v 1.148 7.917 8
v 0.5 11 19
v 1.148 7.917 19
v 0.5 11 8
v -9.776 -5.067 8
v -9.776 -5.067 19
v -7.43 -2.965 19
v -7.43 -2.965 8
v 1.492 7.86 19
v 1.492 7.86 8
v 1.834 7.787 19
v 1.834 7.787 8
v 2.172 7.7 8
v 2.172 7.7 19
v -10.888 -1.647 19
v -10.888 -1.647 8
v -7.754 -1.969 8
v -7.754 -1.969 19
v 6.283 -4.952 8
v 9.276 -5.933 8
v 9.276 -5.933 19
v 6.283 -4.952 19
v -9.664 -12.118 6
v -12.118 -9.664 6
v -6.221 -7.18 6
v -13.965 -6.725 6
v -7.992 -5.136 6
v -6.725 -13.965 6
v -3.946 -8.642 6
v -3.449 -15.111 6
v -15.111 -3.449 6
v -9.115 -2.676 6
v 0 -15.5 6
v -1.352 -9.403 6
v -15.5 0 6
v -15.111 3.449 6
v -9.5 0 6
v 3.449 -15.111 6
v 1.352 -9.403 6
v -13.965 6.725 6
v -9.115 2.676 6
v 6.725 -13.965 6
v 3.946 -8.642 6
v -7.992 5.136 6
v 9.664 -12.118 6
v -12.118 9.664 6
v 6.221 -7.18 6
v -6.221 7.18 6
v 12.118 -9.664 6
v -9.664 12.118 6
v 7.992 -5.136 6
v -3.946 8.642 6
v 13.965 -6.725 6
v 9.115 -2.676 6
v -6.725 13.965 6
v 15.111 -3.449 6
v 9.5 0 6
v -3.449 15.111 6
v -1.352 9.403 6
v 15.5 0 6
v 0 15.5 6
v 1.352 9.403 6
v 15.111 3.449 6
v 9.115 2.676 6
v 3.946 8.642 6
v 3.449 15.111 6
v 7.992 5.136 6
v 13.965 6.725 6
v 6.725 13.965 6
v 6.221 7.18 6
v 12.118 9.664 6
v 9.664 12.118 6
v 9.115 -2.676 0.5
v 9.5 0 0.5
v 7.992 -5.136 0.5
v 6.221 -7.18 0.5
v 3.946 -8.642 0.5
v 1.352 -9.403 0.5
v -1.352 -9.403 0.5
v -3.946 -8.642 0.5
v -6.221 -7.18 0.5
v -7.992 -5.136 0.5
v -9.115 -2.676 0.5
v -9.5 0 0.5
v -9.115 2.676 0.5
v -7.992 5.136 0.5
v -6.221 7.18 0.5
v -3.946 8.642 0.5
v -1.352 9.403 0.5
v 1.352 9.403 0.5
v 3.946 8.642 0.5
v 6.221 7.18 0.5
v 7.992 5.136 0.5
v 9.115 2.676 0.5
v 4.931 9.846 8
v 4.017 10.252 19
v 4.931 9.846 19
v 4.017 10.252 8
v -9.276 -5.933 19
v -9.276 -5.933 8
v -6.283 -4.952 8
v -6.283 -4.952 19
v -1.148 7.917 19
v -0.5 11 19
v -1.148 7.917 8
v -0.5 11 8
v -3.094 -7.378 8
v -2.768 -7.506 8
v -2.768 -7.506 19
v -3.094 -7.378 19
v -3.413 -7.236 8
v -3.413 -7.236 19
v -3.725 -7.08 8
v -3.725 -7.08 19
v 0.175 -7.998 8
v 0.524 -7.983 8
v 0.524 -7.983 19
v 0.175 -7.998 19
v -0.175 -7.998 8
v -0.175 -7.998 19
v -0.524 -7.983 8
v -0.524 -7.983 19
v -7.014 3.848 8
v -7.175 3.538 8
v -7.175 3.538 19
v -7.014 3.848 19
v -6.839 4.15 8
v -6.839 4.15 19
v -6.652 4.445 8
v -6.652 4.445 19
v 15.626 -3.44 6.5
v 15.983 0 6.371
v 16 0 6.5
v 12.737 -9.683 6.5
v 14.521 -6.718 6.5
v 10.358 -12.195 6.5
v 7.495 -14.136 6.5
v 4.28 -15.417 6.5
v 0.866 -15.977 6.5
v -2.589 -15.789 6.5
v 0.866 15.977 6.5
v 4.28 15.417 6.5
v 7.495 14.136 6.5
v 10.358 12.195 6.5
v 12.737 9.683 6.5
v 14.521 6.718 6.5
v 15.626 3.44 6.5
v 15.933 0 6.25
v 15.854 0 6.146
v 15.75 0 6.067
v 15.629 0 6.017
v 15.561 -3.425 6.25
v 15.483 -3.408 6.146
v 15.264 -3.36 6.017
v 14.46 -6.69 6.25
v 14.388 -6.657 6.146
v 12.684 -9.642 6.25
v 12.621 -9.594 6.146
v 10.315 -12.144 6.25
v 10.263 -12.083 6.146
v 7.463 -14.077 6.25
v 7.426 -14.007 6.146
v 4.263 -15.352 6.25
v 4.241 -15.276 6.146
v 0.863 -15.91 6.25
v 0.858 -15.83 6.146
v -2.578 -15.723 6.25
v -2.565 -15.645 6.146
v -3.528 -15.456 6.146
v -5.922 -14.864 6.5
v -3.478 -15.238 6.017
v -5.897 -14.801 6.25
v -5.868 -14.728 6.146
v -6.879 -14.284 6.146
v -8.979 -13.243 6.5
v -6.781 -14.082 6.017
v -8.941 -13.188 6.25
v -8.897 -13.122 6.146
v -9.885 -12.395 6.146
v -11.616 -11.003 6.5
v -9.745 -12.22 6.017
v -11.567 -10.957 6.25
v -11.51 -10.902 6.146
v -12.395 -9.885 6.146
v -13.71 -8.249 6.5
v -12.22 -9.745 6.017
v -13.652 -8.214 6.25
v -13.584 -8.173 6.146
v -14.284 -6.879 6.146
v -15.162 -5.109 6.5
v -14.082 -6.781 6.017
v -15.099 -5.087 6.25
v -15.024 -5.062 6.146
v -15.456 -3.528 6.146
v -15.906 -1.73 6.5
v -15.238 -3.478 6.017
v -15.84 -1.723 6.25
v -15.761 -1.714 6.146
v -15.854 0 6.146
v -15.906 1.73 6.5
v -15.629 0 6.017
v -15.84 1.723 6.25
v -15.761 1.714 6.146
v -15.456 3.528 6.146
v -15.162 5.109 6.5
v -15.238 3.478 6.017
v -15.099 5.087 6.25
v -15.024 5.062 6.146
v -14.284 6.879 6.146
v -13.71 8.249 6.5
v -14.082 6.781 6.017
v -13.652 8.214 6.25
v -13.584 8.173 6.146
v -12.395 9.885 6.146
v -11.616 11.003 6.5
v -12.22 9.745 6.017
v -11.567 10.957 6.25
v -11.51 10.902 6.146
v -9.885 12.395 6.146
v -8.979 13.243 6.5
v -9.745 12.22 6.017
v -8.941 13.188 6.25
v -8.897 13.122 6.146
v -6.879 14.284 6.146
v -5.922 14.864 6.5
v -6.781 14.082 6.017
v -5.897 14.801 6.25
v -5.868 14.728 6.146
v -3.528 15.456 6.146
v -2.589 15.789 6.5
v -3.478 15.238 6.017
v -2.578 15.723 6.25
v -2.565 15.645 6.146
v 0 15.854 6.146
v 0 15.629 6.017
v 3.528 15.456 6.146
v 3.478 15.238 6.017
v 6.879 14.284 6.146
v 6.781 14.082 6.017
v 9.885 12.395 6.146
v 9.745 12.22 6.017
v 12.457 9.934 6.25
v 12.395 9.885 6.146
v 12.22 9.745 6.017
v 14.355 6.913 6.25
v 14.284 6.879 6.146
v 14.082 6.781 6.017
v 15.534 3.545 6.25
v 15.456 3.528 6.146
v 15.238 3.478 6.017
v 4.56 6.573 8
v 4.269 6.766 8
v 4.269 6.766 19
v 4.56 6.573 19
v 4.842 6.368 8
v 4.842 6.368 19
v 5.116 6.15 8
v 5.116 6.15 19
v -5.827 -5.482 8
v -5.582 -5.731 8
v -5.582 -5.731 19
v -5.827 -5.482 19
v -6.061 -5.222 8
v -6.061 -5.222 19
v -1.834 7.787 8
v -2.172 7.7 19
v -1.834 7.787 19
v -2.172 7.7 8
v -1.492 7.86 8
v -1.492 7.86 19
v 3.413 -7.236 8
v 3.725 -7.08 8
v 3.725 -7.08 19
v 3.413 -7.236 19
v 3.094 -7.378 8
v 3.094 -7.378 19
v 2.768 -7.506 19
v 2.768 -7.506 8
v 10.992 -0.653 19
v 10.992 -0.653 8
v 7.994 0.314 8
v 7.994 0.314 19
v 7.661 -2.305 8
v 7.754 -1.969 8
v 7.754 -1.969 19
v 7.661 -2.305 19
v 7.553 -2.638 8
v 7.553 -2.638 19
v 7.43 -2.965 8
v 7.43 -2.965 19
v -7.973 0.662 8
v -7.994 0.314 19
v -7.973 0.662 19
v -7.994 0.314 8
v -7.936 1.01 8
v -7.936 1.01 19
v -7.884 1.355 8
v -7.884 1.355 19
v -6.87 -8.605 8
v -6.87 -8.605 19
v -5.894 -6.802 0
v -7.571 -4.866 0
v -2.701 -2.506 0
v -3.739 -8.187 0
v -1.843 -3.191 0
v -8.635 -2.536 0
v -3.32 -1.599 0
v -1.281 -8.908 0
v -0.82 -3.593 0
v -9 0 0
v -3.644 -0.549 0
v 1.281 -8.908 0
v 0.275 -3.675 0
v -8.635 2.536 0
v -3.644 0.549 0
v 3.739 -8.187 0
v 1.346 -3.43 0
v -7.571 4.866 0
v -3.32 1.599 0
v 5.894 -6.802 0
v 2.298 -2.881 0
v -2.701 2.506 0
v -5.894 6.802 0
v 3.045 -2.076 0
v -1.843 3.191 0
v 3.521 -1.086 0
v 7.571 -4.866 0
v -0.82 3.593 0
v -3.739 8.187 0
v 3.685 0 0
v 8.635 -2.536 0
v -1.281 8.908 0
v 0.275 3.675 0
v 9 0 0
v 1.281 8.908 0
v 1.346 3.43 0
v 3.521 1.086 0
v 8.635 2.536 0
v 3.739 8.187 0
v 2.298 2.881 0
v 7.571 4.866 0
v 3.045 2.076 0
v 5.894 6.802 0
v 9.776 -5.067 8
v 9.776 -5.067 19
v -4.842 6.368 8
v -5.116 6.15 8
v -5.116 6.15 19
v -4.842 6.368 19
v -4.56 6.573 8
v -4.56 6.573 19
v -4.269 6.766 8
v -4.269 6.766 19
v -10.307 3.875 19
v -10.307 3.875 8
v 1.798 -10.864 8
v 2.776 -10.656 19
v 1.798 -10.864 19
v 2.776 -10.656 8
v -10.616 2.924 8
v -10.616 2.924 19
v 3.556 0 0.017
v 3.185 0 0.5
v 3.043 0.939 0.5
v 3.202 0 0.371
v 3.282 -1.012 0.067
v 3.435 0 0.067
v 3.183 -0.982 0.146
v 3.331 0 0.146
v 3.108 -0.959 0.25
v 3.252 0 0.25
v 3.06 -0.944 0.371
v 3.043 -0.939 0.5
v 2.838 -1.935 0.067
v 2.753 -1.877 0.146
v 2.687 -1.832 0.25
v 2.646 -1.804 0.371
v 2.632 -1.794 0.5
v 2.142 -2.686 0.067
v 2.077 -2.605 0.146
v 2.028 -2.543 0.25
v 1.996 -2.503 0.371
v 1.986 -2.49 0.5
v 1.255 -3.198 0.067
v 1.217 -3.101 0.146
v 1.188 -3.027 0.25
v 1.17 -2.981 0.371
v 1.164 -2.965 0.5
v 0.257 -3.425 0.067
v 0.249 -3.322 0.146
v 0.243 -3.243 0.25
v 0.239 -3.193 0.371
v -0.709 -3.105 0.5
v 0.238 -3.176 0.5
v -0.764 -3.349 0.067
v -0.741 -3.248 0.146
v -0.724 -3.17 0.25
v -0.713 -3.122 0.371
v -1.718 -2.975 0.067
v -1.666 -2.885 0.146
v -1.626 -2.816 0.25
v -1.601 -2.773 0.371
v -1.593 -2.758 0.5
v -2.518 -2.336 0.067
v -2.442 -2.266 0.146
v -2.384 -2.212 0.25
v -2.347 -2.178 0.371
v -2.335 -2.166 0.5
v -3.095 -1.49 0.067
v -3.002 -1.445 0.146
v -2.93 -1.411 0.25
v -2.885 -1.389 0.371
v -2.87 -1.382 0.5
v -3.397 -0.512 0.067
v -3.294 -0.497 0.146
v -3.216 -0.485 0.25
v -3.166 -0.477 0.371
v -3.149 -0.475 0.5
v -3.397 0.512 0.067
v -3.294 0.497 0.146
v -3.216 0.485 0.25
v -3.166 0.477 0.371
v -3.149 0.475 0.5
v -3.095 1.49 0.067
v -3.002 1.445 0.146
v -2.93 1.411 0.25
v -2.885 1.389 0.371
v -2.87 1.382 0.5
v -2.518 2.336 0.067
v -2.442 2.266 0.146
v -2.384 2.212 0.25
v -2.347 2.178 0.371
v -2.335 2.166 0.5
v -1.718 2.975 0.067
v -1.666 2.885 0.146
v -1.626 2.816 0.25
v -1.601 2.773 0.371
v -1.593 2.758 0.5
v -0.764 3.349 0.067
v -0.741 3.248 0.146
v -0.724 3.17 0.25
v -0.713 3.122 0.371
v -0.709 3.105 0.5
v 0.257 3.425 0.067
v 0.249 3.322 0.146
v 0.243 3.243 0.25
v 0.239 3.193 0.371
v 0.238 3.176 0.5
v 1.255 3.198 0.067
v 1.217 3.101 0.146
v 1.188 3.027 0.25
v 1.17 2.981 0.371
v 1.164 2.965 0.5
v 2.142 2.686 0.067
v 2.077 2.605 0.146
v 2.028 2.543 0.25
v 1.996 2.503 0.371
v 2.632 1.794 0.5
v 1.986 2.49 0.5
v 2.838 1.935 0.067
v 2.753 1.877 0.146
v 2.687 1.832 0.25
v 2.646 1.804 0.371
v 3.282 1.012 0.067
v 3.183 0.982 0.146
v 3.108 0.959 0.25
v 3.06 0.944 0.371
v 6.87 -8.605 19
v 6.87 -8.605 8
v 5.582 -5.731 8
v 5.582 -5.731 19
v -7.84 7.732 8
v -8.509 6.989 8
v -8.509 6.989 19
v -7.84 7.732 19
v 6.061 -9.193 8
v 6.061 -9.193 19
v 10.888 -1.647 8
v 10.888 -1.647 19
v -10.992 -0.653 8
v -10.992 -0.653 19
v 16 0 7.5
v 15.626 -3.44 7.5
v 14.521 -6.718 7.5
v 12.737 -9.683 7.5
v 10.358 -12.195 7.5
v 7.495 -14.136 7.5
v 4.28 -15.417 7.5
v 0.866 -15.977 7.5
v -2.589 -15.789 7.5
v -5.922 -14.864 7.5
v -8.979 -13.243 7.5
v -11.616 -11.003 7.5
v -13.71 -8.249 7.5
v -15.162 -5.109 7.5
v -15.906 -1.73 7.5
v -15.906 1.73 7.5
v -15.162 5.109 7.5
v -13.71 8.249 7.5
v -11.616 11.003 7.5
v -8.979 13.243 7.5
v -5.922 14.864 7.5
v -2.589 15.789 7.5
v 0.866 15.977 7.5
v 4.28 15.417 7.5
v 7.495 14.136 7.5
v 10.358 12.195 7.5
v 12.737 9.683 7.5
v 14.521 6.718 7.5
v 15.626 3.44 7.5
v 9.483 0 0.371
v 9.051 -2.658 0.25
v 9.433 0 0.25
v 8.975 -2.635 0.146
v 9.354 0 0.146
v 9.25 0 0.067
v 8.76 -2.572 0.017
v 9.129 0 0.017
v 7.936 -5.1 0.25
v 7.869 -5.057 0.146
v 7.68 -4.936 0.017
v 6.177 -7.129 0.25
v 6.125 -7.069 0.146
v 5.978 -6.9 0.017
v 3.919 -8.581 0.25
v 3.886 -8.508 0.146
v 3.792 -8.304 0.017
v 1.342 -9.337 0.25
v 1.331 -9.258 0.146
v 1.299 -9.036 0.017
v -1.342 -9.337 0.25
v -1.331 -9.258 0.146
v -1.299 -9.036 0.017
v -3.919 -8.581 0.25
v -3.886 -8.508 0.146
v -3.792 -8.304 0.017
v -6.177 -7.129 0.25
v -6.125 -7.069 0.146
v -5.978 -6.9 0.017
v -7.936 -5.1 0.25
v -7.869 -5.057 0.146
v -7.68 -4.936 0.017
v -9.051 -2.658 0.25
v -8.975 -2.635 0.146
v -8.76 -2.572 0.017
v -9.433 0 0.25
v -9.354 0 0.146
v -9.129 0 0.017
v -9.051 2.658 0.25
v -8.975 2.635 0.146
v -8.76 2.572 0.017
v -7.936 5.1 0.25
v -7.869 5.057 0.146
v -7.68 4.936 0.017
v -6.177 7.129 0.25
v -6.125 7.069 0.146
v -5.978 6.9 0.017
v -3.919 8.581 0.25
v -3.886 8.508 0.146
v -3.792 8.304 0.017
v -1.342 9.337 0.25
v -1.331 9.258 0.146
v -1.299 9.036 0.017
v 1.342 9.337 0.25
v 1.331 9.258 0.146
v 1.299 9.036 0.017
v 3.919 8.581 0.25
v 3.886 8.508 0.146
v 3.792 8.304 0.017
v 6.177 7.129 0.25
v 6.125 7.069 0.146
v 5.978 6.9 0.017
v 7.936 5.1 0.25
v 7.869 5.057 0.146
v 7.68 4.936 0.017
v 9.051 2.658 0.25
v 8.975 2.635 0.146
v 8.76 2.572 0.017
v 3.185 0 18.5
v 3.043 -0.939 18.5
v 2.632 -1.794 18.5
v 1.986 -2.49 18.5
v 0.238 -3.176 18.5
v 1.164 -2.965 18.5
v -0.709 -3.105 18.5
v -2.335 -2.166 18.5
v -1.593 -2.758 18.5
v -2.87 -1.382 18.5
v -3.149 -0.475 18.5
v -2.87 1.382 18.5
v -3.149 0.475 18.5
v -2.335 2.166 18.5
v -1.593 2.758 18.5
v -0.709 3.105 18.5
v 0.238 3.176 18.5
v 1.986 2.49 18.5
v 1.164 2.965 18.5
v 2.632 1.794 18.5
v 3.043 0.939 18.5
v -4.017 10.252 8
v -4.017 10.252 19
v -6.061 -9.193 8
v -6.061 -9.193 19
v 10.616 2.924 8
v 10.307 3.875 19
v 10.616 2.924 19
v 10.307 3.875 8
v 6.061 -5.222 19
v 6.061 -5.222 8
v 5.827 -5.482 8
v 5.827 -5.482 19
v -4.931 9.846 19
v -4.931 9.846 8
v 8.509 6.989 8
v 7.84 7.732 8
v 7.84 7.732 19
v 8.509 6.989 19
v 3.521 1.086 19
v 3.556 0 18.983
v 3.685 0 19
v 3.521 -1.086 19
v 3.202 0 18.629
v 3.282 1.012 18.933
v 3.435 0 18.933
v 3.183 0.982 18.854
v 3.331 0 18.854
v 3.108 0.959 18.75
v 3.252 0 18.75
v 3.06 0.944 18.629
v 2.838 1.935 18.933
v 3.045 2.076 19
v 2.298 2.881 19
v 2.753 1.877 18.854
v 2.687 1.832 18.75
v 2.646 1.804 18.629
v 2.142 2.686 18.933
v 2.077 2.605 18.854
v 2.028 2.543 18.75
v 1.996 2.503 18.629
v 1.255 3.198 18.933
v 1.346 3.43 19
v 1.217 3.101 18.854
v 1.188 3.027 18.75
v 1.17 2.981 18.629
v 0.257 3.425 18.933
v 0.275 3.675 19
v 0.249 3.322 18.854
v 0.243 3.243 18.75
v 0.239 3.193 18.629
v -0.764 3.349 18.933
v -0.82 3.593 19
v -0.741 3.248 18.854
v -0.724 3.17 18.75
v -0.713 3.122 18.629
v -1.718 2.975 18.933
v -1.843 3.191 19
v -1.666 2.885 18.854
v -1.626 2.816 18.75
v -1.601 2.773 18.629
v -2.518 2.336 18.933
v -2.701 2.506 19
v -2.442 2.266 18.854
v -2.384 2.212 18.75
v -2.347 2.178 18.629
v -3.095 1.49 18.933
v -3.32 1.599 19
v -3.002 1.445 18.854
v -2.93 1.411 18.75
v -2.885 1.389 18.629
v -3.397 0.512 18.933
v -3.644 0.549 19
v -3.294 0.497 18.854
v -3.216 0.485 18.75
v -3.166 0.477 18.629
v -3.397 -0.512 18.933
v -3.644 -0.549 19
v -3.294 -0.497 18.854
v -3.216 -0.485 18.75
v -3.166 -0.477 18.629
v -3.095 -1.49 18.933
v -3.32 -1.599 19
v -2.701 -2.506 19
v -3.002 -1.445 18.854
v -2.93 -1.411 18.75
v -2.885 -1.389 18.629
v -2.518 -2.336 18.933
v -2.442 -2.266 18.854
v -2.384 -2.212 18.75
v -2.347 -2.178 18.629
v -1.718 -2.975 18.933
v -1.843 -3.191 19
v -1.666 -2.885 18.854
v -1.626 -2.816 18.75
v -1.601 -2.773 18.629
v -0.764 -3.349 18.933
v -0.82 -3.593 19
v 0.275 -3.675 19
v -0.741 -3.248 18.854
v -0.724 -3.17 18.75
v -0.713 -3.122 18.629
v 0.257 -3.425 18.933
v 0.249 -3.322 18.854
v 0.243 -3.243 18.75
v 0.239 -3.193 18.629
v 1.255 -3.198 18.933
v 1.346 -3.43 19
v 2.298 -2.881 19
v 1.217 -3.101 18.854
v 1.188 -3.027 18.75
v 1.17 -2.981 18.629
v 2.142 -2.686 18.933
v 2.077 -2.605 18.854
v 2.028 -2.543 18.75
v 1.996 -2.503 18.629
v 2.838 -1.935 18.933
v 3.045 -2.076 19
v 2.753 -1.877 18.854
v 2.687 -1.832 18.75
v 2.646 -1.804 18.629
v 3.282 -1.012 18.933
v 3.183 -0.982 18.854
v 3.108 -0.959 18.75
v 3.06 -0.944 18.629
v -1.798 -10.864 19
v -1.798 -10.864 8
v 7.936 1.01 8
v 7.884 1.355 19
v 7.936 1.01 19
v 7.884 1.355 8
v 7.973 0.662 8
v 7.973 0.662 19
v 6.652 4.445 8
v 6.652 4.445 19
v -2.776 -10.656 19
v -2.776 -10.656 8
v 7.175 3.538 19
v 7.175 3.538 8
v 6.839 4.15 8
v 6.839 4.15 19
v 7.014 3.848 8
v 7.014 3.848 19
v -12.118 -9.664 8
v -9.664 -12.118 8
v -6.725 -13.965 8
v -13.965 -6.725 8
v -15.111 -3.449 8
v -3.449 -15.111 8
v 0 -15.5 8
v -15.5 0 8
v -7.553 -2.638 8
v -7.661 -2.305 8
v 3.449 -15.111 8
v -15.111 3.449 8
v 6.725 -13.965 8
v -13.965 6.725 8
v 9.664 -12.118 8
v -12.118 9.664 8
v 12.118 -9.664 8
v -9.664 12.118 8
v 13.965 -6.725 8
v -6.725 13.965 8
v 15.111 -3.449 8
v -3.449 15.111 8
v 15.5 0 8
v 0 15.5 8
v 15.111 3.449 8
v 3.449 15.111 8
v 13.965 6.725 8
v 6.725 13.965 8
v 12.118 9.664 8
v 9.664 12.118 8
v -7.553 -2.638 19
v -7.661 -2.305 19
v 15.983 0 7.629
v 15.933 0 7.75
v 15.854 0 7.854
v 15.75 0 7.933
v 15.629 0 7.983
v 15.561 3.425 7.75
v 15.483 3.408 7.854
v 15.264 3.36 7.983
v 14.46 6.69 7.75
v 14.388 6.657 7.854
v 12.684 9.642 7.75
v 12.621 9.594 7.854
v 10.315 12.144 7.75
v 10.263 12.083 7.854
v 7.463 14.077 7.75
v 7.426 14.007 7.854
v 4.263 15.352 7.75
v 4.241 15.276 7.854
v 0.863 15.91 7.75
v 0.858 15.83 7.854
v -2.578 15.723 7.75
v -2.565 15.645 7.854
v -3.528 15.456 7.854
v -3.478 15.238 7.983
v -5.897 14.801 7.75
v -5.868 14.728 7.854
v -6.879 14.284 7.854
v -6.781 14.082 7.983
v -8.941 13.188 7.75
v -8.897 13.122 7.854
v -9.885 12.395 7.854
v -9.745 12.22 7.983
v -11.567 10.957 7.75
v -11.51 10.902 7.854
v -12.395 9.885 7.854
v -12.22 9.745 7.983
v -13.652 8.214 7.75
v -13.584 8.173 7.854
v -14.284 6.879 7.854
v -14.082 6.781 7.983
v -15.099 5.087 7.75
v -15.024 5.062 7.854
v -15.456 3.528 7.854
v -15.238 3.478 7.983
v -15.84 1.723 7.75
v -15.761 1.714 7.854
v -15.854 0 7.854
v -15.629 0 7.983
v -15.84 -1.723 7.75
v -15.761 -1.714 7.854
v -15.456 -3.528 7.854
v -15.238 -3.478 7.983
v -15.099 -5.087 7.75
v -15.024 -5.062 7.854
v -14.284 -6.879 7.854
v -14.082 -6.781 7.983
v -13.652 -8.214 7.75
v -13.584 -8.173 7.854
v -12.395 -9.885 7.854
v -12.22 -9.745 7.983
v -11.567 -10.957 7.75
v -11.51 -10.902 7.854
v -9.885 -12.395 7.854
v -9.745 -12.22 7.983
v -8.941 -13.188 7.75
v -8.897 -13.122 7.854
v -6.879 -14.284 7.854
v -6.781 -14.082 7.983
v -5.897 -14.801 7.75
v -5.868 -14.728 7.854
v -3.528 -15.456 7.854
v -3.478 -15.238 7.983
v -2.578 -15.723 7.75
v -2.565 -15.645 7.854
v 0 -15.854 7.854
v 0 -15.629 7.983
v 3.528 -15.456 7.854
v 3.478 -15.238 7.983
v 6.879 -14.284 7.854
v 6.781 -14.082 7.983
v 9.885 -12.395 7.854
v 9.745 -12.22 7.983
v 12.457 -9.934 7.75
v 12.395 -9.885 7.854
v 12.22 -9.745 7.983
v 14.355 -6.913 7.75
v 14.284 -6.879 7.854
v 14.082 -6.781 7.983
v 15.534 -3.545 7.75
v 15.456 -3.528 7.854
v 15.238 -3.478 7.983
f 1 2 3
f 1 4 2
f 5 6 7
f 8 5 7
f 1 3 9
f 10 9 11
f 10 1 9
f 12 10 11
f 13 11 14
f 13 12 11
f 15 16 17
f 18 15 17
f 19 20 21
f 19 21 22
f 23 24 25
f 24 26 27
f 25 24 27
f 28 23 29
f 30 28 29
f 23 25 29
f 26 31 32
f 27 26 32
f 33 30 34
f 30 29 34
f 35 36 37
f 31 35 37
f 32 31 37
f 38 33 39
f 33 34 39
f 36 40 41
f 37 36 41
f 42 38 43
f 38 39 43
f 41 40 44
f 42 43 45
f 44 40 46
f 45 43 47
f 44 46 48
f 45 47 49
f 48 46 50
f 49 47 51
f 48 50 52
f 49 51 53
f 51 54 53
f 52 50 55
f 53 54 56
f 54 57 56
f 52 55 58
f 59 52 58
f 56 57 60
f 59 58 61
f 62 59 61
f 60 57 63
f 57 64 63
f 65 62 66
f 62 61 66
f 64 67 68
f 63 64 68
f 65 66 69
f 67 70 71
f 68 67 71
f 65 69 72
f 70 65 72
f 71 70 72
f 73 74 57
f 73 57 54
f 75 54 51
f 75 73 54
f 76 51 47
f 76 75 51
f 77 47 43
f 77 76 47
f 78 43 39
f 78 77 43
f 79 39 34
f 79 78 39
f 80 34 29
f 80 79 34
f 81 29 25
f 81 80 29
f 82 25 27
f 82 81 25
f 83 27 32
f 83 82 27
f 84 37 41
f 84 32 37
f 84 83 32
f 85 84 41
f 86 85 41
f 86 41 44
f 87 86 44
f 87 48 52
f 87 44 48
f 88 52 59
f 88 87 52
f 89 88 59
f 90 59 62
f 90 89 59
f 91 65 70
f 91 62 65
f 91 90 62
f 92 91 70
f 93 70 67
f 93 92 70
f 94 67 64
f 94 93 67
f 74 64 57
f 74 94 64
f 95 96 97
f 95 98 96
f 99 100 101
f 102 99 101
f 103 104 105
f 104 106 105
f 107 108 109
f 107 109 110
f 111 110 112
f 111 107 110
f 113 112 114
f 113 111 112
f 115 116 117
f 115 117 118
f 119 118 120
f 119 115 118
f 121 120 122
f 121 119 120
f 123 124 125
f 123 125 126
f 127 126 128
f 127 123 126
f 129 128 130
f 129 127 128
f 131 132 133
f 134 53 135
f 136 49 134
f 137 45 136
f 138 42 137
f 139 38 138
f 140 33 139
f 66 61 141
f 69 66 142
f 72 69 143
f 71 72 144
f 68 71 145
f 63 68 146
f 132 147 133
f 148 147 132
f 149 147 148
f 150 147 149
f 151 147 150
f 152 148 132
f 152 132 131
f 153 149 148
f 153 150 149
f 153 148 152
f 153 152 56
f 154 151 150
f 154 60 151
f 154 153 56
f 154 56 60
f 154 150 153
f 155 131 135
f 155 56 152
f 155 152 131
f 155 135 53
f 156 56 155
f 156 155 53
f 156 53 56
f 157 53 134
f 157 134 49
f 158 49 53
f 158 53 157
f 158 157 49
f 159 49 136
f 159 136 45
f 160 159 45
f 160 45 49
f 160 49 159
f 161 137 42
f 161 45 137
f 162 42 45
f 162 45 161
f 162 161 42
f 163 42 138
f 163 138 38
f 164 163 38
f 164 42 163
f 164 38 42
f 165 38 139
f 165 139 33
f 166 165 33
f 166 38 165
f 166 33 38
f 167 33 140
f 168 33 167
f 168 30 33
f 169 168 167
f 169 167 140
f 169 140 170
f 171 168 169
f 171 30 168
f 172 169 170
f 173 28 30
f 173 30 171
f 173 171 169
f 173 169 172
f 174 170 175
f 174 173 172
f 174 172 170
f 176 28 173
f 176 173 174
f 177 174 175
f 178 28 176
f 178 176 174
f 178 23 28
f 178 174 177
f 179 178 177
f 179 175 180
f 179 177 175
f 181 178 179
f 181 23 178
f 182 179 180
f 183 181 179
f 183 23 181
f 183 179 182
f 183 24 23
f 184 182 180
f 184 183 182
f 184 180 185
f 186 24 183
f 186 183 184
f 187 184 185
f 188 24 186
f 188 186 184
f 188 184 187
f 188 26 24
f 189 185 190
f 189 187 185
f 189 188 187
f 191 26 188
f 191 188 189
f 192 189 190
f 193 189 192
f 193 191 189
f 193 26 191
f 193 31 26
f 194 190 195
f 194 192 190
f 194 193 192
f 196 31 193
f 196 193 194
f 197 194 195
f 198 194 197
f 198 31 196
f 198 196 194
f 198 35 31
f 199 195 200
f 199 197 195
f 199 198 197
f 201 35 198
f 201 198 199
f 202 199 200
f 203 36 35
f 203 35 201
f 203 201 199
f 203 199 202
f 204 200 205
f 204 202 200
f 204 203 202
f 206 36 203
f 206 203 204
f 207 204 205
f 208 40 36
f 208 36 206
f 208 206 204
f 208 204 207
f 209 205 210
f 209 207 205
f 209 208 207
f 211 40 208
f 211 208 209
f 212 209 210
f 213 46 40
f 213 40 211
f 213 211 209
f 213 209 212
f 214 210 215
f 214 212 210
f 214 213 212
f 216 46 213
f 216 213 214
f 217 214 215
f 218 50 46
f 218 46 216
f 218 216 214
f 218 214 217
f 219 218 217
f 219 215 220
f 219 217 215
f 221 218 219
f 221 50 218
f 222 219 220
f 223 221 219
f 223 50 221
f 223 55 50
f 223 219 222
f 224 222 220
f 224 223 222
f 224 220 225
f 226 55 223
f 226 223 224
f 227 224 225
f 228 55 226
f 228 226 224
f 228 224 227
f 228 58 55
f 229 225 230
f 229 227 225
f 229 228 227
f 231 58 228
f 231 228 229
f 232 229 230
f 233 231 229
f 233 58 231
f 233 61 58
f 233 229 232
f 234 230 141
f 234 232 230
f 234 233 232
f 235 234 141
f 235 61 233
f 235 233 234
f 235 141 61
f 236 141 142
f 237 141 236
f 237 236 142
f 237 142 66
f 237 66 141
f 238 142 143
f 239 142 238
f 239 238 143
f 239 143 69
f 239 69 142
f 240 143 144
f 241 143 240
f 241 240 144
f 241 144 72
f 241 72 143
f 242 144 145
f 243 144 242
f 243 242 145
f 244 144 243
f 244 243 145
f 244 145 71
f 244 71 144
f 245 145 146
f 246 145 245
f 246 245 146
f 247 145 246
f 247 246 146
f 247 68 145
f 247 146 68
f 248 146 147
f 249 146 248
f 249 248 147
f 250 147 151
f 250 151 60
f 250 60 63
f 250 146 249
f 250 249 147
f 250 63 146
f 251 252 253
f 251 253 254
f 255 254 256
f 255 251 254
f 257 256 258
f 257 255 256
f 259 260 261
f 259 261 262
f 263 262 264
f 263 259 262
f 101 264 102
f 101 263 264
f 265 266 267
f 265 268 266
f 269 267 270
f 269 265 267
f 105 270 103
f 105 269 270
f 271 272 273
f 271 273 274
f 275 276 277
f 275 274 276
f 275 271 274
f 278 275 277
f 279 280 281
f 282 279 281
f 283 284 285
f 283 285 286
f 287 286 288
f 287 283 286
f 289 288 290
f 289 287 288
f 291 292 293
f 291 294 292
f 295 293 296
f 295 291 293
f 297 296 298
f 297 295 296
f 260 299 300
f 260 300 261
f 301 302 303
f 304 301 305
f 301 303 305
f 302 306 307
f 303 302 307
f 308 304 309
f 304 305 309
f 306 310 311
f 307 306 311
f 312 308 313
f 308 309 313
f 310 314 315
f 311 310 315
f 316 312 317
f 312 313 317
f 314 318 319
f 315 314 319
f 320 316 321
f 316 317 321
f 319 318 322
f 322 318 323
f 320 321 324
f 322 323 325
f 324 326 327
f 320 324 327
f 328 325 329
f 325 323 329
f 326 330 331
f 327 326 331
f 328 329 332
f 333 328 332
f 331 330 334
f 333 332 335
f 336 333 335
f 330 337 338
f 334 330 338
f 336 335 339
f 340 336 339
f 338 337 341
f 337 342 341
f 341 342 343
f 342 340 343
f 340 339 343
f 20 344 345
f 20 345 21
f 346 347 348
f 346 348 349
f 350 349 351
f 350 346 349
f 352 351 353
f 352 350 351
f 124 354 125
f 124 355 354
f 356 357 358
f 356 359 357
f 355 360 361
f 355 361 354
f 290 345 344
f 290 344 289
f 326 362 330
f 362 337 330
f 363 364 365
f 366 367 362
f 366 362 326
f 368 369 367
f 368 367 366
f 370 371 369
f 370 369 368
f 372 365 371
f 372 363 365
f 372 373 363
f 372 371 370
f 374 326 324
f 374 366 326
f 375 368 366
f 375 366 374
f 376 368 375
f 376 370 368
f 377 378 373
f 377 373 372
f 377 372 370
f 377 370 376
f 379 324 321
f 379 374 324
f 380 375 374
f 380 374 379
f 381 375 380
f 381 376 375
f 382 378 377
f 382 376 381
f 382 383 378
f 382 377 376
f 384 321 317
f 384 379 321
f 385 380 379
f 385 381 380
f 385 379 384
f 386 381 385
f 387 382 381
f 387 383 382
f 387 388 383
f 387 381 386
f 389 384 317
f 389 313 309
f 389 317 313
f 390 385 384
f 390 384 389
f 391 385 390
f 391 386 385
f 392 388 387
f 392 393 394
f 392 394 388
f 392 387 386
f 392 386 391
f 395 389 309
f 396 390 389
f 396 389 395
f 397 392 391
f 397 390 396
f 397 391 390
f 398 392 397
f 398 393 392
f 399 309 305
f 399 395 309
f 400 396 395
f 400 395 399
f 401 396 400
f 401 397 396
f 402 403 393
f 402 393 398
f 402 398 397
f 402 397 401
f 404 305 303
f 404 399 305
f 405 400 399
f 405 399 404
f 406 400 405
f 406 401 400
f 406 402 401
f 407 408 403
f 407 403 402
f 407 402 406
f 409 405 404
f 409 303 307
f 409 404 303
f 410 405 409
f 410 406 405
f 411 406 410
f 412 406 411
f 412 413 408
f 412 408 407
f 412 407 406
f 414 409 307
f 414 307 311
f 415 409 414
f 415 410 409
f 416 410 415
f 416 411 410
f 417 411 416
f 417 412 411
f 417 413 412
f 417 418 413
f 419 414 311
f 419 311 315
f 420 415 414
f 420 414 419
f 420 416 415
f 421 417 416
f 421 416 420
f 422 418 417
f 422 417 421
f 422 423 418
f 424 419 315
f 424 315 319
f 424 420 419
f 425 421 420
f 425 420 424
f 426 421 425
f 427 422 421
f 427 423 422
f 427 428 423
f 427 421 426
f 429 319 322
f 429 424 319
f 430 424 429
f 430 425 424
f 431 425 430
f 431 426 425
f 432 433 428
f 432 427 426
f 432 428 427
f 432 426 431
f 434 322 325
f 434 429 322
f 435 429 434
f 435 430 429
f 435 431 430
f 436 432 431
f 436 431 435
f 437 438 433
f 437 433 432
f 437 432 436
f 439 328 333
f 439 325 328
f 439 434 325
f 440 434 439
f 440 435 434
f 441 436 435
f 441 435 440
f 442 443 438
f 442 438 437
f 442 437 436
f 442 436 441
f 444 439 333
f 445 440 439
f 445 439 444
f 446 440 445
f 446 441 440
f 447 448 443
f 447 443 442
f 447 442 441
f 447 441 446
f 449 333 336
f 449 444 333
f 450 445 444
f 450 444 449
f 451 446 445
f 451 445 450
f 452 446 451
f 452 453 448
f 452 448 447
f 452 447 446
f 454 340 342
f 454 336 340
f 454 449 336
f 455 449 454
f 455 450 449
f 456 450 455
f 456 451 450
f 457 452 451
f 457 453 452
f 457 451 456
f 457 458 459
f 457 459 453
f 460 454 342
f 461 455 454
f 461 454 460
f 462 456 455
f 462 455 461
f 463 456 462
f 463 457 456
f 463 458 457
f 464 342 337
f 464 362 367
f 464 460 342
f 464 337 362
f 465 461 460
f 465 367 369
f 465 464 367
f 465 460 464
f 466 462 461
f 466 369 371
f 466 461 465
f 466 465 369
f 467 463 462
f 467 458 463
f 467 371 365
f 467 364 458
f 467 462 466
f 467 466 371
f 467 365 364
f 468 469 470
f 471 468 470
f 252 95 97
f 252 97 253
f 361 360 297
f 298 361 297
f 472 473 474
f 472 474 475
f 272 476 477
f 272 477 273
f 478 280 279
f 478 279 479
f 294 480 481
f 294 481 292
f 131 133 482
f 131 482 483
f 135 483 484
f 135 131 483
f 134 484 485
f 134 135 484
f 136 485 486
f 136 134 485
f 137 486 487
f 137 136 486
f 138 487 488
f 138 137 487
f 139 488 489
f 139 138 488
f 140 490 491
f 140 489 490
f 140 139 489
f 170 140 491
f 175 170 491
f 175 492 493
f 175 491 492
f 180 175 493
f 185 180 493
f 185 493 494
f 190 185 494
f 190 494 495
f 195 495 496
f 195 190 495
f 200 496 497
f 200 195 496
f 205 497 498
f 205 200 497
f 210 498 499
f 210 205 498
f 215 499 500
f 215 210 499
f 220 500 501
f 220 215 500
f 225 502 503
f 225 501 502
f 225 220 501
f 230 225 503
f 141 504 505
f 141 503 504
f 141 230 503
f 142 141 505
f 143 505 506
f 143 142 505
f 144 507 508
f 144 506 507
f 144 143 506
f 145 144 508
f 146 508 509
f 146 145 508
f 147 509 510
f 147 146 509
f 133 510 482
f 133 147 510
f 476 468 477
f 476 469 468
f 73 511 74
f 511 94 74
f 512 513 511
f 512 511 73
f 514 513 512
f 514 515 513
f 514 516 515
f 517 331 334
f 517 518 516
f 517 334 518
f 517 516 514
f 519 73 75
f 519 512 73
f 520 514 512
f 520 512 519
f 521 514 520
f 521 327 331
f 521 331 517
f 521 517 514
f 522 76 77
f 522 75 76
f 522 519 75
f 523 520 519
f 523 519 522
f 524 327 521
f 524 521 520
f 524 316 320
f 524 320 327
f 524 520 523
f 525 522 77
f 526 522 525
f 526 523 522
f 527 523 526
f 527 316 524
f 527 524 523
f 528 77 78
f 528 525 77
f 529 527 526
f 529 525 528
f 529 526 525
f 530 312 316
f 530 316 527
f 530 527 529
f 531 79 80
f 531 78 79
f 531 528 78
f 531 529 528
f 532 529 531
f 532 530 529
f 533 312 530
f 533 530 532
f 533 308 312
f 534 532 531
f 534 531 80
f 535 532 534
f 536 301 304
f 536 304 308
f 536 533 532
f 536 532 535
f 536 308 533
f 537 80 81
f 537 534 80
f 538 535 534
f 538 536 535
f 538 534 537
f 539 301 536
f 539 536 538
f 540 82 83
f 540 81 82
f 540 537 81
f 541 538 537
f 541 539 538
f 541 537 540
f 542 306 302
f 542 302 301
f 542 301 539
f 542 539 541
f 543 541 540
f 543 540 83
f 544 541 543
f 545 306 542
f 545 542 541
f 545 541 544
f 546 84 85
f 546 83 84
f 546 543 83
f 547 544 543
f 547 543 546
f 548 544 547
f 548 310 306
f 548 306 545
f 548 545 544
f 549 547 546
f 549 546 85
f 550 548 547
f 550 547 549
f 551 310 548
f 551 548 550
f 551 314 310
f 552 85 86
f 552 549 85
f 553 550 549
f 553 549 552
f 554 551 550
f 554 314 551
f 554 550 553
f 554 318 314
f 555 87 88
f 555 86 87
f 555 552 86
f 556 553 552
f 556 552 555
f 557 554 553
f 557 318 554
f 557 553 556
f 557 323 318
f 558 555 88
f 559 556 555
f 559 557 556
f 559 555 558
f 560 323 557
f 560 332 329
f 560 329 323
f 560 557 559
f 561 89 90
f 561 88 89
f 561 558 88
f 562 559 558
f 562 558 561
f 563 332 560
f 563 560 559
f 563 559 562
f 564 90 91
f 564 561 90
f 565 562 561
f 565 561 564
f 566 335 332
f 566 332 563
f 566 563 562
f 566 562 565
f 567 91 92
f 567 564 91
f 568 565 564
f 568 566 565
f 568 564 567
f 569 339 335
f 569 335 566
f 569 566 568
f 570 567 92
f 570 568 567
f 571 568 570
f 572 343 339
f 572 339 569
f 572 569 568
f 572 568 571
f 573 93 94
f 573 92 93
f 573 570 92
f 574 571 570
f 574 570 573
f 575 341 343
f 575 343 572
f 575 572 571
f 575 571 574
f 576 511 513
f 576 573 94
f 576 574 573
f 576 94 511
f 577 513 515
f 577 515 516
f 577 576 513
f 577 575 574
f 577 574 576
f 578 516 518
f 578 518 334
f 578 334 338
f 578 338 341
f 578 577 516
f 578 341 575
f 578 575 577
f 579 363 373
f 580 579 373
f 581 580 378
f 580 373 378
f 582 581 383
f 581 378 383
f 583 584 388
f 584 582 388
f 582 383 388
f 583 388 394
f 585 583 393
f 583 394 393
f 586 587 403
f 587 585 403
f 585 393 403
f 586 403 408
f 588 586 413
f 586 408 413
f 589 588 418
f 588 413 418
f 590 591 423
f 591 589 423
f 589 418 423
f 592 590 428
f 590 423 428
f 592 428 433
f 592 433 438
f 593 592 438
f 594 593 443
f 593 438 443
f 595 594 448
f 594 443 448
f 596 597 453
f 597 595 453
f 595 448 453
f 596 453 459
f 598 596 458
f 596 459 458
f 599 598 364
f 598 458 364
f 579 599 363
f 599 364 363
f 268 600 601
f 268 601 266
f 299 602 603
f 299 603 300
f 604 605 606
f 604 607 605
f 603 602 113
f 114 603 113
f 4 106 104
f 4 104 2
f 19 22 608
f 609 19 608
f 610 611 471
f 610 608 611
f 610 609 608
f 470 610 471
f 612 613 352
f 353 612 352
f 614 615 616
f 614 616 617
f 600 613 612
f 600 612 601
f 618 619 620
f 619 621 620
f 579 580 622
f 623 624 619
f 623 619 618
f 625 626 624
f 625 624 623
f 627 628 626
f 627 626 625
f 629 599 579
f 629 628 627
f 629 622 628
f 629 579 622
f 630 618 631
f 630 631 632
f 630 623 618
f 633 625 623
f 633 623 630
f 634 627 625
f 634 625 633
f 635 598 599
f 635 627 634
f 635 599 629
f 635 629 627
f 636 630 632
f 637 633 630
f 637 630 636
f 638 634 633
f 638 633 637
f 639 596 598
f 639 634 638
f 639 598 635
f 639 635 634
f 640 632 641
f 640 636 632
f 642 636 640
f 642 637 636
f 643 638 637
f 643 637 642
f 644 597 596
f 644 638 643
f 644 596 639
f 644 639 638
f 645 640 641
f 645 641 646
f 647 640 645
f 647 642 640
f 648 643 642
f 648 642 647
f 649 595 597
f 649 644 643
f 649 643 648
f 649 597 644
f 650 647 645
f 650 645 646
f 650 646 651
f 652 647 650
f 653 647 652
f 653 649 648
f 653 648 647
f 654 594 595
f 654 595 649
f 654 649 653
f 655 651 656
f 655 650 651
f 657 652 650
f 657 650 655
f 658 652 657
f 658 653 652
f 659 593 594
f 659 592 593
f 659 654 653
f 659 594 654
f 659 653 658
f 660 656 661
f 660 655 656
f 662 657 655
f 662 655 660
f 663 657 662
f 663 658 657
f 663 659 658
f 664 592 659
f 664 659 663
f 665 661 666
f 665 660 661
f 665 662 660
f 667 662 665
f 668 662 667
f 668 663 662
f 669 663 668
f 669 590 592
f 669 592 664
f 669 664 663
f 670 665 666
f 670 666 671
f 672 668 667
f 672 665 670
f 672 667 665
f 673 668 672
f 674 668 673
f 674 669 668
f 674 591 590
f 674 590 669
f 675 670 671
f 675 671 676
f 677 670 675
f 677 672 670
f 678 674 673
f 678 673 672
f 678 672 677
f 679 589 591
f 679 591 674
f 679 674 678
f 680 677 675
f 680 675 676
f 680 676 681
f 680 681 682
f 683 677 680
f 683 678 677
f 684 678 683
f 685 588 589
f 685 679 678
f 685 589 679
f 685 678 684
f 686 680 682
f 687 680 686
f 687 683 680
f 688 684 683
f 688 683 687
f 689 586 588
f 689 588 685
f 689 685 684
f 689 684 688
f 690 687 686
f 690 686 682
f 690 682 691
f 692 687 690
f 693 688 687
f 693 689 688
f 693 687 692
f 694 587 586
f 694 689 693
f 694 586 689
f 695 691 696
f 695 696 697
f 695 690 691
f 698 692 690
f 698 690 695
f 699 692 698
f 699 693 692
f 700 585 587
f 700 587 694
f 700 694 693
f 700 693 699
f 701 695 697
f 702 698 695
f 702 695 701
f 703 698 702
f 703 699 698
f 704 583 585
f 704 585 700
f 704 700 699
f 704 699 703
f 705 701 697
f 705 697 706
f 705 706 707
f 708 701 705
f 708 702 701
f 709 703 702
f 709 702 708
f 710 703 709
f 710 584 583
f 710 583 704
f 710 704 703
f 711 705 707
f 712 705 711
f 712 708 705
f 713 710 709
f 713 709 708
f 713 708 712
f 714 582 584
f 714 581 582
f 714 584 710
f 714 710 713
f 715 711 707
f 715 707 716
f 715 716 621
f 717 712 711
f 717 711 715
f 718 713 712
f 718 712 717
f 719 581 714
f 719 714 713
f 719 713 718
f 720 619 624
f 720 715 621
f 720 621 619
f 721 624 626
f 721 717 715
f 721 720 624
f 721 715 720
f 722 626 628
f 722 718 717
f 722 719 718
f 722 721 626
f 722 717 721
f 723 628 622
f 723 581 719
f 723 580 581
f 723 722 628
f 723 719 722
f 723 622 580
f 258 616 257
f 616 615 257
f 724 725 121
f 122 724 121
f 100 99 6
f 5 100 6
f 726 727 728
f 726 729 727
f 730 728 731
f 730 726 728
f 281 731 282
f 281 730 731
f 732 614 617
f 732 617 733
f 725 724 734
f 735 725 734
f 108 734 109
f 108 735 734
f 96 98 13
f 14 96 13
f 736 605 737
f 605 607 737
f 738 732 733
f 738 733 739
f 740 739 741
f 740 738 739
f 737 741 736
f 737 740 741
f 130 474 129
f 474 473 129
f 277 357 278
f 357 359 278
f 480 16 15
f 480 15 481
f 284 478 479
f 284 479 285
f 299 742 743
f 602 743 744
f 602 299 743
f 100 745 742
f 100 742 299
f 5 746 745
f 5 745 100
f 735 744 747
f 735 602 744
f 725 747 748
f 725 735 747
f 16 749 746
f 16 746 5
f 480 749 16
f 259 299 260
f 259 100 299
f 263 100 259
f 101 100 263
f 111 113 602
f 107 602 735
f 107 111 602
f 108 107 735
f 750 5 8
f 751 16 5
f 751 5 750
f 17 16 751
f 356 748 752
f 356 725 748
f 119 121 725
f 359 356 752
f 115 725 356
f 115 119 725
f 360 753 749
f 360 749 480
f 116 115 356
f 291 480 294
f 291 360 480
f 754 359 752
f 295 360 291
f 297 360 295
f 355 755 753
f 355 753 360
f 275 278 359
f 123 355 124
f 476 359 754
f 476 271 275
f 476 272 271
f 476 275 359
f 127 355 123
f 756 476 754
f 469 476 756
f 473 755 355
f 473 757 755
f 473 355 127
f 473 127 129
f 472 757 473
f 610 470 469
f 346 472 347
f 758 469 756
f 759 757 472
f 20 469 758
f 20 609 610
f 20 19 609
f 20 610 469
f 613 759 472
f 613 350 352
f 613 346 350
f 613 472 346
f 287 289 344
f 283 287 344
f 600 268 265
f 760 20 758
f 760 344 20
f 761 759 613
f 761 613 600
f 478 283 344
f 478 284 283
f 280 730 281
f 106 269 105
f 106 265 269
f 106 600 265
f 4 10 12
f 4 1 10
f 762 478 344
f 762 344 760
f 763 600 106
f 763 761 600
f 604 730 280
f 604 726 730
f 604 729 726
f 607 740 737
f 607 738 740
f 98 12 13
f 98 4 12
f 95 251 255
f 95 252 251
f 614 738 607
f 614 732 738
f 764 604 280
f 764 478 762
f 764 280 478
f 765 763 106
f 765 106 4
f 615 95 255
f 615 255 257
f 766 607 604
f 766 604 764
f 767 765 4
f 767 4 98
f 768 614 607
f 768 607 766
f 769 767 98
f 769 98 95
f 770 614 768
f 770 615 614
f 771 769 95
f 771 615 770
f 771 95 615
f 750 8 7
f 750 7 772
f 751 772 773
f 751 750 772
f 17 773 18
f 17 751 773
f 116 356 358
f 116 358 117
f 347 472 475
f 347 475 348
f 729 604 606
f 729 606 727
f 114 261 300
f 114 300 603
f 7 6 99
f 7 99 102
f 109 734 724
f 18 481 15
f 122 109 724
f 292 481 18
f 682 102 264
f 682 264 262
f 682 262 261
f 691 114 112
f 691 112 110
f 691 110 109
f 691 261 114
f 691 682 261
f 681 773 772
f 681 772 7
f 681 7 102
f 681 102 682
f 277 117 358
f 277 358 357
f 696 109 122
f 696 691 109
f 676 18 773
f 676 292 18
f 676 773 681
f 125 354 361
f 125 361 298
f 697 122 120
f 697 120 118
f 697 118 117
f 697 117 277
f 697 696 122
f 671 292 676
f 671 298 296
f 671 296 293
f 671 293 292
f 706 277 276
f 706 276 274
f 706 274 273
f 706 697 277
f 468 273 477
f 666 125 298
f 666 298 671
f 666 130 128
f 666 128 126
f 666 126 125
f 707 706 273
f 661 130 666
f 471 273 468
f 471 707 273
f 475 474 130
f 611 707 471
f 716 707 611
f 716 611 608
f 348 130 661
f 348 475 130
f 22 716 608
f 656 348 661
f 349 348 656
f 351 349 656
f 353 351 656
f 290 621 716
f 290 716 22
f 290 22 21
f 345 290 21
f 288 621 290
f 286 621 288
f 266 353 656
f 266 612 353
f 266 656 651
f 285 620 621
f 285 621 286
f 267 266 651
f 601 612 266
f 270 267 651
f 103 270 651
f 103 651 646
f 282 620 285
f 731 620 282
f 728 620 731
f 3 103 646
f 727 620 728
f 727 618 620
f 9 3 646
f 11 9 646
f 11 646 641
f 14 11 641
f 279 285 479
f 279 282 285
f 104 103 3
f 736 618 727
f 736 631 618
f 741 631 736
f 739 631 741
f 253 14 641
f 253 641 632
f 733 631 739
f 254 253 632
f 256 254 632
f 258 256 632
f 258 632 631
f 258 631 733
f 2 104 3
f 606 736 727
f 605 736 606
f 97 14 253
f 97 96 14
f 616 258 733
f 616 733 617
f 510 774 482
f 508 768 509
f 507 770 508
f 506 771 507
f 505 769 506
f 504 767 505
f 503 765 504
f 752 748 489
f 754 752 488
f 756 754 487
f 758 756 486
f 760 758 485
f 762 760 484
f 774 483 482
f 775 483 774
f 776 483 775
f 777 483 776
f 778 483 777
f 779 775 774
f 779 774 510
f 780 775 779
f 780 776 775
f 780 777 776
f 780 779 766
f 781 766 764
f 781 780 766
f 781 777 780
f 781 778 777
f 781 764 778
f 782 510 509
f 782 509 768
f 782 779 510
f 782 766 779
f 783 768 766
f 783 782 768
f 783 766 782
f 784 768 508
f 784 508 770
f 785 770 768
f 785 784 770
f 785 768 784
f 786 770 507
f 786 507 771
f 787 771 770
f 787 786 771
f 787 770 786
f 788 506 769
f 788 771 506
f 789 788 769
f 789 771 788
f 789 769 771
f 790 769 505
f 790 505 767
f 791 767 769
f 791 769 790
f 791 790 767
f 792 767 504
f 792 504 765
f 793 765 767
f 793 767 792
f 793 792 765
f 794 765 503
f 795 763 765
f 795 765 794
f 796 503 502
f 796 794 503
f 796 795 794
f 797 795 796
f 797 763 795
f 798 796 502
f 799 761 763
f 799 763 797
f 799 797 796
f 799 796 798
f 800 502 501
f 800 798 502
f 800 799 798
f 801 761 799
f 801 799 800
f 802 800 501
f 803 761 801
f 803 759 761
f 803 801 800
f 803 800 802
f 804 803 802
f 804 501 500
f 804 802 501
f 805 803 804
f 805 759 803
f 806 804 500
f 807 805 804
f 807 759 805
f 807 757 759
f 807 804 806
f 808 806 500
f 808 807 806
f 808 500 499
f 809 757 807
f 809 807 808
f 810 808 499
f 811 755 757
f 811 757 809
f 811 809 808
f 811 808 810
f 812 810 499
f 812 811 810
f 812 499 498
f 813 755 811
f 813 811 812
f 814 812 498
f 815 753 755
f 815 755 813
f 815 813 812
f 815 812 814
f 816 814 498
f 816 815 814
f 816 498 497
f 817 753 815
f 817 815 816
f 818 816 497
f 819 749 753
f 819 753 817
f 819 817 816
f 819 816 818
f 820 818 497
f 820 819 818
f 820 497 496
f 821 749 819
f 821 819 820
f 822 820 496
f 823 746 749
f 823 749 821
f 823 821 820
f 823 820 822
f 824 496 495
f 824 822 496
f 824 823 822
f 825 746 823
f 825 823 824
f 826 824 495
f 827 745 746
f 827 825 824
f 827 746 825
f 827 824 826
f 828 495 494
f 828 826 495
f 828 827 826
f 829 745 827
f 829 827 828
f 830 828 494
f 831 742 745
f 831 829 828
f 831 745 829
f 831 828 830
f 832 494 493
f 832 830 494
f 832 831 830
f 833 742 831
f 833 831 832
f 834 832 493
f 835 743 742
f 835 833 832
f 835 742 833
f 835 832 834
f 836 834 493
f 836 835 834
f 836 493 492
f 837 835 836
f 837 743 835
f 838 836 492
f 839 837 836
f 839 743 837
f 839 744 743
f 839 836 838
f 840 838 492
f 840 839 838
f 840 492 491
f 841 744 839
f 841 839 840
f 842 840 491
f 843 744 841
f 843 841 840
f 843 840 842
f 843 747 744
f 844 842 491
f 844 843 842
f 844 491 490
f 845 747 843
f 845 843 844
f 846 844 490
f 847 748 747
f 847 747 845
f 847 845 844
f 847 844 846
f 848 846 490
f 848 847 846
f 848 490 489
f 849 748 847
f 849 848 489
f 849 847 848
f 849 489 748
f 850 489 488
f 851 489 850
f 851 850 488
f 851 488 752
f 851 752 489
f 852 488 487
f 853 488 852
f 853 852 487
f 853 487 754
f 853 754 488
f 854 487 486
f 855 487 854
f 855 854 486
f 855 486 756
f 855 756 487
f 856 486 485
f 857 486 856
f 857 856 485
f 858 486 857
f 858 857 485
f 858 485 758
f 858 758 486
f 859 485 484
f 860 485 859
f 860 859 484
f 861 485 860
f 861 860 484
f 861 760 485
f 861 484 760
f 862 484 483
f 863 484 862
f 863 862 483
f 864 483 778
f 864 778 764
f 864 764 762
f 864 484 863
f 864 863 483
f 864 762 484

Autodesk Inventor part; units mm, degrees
ref_plane "YZ Plane" through (0, 0, 0) normal (1, 0, 0) x (0, 1, 0)
ref_plane "XZ Plane" through (0, 0, 0) normal (0, 1, 0) x (-1, 0, 0)
ref_plane "XY Plane" through (0, 0, 0) normal (0, 0, 1) x (1, 0, 0)
sketch "Szkic1" plane through (0, 0, 0) normal (0, 0, 1) x (1, 0, 0)
  circle A0 centre (0, 0) radius 9.5
  circle A1 centre (0, 0) radius 3.185
  dimension "d0" = 19
  dimension "d3" = 6.37
extrude "Wyciągnięcie proste2" add sketch "Szkic1" along normal blind 6
sketch "Szkic2" plane through (0, 0, 6) normal (0, 0, 1) x (1, 0, 0)
  circle A0 centre (0, 0) radius 3.185 projected
  circle A1 centre (0, 0) radius 16
  circle A2 centre (0, 0) radius 3.185
  dimension "d6" = 32
extrude "Wyciągnięcie proste3" add sketch "Szkic2" along normal blind 2
sketch "Szkic3" plane through (0, 0, 8) normal (0, 0, 1) x (1, 0, 0)
  circle A0 centre (0, 0) radius 8
  circle A1 centre (0, 0) radius 3.185
  line L0 (0, 8) -> (0, 11) construction
  line L1 (-0.5, 11) -> (0.5, 11)
  line L2 (0.5, 11) -> (1.1475, 7.9173)
  line L3 (-0.5, 11) -> (-1.1475, 7.9173)
  line L4 (-3.2539, 7.3084) -> (-4.4741, 10.049) construction
  line L5 (-4.9309, 9.8456) -> (-4.2686, 6.766)
  line L6 (-4.9309, 9.8456) -> (-4.0173, 10.2524)
  line L7 (-4.0173, 10.2524) -> (-2.1719, 7.6995)
  line L8 (-5.9452, 5.353) -> (-8.1746, 7.3604) construction
  line L9 (-8.5092, 6.9889) -> (-6.6515, 4.4449)
  line L10 (-8.5092, 6.9889) -> (-7.84, 7.732)
  line L11 (-7.84, 7.732) -> (-5.1158, 6.1505)
  line L12 (-7.6085, 2.4721) -> (-10.4616, 3.3992) construction
  line L13 (-10.6161, 2.9237) -> (-7.8844, 1.3552)
  line L14 (-10.6161, 2.9237) -> (-10.3071, 3.8747)
  line L15 (-10.3071, 3.8747) -> (-7.1752, 3.5379)
  line L16 (-7.9562, -0.8362) -> (-10.9397, -1.1498) construction
  line L17 (-10.8875, -1.6471) -> (-7.754, -1.9688)
  line L18 (-10.8875, -1.6471) -> (-10.992, -0.6526)
  line L19 (-10.992, -0.6526) -> (-7.9938, 0.3137)
  line L20 (-6.9282, -4) -> (-9.5263, -5.5) construction
  line L21 (-9.2763, -5.933) -> (-6.2828, -4.9524)
  line L22 (-9.2763, -5.933) -> (-9.7763, -5.067)
  line L23 (-9.7763, -5.067) -> (-7.4303, -2.9649)
  line L24 (-4.7023, -6.4721) -> (-6.4656, -8.8992) construction
  line L25 (-6.0611, -9.1931) -> (-3.7253, -7.0797)
  line L26 (-6.0611, -9.1931) -> (-6.8701, -8.6053)
  line L27 (-6.8701, -8.6053) -> (-5.582, -5.7307)
  line L28 (-1.6633, -7.8252) -> (-2.287, -10.7596) construction
  line L29 (-1.798, -10.8636) -> (-0.5236, -7.9828)
  line L30 (-1.798, -10.8636) -> (-2.7761, -10.6557)
  line L31 (-2.7761, -10.6557) -> (-2.7685, -7.5057)
  line L32 (1.6633, -7.8252) -> (2.287, -10.7596) construction
  line L33 (2.7761, -10.6557) -> (2.7685, -7.5057)
  line L34 (2.7761, -10.6557) -> (1.798, -10.8636)
  line L35 (1.798, -10.8636) -> (0.5236, -7.9828)
  line L36 (4.7023, -6.4721) -> (6.4656, -8.8992) construction
  line L37 (6.8701, -8.6053) -> (5.582, -5.7307)
  line L38 (6.8701, -8.6053) -> (6.0611, -9.1931)
  line L39 (6.0611, -9.1931) -> (3.7253, -7.0797)
  line L40 (6.9282, -4) -> (9.5263, -5.5) construction
  line L41 (9.7763, -5.067) -> (7.4303, -2.9649)
  line L42 (9.7763, -5.067) -> (9.2763, -5.933)
  line L43 (9.2763, -5.933) -> (6.2828, -4.9524)
  line L44 (7.9562, -0.8362) -> (10.9397, -1.1498) construction
  line L45 (10.992, -0.6526) -> (7.9938, 0.3137)
  line L46 (10.992, -0.6526) -> (10.8875, -1.6471)
  line L47 (10.8875, -1.6471) -> (7.754, -1.9688)
  line L48 (7.6085, 2.4721) -> (10.4616, 3.3992) construction
  line L49 (10.3071, 3.8747) -> (7.1752, 3.5379)
  line L50 (10.3071, 3.8747) -> (10.6161, 2.9237)
  line L51 (10.6161, 2.9237) -> (7.8844, 1.3552)
  line L52 (5.9452, 5.353) -> (8.1746, 7.3604) construction
  line L53 (7.84, 7.732) -> (5.1158, 6.1505)
  line L54 (7.84, 7.732) -> (8.5092, 6.9889)
  line L55 (8.5092, 6.9889) -> (6.6515, 4.4449)
  line L56 (3.2539, 7.3084) -> (4.4741, 10.049) construction
  line L57 (4.0173, 10.2524) -> (2.1719, 7.6995)
  line L58 (4.0173, 10.2524) -> (4.9309, 9.8456)
  line L59 (4.9309, 9.8456) -> (4.2686, 6.766)
  dimension "d9" = 16
  dimension "d10" = 3
  dimension "d11" = 1
  dimension "d12" = 3.15
  dimension "d15" = 360
extrude "Wyciągnięcie proste4" add sketch "Szkic3" along normal blind 11
sketch "Szkic4" plane through (0, 0, 19) normal (0, 0, 1) x (1, 0, 0)
  point P0 (0, 0)
fillet "Zaokrąglenie1" radius 0.5 1 edges at (-16, 0, 8)
fillet "Zaokrąglenie2" radius 0.5 4 edges at (-16, 0, 6) (-9.5, 0, 0) (-3.185, 0, 19) (-3.185, 0, 0)
properties part number "kolo_zebate_do_pasa_fi32_6,370_L19"
